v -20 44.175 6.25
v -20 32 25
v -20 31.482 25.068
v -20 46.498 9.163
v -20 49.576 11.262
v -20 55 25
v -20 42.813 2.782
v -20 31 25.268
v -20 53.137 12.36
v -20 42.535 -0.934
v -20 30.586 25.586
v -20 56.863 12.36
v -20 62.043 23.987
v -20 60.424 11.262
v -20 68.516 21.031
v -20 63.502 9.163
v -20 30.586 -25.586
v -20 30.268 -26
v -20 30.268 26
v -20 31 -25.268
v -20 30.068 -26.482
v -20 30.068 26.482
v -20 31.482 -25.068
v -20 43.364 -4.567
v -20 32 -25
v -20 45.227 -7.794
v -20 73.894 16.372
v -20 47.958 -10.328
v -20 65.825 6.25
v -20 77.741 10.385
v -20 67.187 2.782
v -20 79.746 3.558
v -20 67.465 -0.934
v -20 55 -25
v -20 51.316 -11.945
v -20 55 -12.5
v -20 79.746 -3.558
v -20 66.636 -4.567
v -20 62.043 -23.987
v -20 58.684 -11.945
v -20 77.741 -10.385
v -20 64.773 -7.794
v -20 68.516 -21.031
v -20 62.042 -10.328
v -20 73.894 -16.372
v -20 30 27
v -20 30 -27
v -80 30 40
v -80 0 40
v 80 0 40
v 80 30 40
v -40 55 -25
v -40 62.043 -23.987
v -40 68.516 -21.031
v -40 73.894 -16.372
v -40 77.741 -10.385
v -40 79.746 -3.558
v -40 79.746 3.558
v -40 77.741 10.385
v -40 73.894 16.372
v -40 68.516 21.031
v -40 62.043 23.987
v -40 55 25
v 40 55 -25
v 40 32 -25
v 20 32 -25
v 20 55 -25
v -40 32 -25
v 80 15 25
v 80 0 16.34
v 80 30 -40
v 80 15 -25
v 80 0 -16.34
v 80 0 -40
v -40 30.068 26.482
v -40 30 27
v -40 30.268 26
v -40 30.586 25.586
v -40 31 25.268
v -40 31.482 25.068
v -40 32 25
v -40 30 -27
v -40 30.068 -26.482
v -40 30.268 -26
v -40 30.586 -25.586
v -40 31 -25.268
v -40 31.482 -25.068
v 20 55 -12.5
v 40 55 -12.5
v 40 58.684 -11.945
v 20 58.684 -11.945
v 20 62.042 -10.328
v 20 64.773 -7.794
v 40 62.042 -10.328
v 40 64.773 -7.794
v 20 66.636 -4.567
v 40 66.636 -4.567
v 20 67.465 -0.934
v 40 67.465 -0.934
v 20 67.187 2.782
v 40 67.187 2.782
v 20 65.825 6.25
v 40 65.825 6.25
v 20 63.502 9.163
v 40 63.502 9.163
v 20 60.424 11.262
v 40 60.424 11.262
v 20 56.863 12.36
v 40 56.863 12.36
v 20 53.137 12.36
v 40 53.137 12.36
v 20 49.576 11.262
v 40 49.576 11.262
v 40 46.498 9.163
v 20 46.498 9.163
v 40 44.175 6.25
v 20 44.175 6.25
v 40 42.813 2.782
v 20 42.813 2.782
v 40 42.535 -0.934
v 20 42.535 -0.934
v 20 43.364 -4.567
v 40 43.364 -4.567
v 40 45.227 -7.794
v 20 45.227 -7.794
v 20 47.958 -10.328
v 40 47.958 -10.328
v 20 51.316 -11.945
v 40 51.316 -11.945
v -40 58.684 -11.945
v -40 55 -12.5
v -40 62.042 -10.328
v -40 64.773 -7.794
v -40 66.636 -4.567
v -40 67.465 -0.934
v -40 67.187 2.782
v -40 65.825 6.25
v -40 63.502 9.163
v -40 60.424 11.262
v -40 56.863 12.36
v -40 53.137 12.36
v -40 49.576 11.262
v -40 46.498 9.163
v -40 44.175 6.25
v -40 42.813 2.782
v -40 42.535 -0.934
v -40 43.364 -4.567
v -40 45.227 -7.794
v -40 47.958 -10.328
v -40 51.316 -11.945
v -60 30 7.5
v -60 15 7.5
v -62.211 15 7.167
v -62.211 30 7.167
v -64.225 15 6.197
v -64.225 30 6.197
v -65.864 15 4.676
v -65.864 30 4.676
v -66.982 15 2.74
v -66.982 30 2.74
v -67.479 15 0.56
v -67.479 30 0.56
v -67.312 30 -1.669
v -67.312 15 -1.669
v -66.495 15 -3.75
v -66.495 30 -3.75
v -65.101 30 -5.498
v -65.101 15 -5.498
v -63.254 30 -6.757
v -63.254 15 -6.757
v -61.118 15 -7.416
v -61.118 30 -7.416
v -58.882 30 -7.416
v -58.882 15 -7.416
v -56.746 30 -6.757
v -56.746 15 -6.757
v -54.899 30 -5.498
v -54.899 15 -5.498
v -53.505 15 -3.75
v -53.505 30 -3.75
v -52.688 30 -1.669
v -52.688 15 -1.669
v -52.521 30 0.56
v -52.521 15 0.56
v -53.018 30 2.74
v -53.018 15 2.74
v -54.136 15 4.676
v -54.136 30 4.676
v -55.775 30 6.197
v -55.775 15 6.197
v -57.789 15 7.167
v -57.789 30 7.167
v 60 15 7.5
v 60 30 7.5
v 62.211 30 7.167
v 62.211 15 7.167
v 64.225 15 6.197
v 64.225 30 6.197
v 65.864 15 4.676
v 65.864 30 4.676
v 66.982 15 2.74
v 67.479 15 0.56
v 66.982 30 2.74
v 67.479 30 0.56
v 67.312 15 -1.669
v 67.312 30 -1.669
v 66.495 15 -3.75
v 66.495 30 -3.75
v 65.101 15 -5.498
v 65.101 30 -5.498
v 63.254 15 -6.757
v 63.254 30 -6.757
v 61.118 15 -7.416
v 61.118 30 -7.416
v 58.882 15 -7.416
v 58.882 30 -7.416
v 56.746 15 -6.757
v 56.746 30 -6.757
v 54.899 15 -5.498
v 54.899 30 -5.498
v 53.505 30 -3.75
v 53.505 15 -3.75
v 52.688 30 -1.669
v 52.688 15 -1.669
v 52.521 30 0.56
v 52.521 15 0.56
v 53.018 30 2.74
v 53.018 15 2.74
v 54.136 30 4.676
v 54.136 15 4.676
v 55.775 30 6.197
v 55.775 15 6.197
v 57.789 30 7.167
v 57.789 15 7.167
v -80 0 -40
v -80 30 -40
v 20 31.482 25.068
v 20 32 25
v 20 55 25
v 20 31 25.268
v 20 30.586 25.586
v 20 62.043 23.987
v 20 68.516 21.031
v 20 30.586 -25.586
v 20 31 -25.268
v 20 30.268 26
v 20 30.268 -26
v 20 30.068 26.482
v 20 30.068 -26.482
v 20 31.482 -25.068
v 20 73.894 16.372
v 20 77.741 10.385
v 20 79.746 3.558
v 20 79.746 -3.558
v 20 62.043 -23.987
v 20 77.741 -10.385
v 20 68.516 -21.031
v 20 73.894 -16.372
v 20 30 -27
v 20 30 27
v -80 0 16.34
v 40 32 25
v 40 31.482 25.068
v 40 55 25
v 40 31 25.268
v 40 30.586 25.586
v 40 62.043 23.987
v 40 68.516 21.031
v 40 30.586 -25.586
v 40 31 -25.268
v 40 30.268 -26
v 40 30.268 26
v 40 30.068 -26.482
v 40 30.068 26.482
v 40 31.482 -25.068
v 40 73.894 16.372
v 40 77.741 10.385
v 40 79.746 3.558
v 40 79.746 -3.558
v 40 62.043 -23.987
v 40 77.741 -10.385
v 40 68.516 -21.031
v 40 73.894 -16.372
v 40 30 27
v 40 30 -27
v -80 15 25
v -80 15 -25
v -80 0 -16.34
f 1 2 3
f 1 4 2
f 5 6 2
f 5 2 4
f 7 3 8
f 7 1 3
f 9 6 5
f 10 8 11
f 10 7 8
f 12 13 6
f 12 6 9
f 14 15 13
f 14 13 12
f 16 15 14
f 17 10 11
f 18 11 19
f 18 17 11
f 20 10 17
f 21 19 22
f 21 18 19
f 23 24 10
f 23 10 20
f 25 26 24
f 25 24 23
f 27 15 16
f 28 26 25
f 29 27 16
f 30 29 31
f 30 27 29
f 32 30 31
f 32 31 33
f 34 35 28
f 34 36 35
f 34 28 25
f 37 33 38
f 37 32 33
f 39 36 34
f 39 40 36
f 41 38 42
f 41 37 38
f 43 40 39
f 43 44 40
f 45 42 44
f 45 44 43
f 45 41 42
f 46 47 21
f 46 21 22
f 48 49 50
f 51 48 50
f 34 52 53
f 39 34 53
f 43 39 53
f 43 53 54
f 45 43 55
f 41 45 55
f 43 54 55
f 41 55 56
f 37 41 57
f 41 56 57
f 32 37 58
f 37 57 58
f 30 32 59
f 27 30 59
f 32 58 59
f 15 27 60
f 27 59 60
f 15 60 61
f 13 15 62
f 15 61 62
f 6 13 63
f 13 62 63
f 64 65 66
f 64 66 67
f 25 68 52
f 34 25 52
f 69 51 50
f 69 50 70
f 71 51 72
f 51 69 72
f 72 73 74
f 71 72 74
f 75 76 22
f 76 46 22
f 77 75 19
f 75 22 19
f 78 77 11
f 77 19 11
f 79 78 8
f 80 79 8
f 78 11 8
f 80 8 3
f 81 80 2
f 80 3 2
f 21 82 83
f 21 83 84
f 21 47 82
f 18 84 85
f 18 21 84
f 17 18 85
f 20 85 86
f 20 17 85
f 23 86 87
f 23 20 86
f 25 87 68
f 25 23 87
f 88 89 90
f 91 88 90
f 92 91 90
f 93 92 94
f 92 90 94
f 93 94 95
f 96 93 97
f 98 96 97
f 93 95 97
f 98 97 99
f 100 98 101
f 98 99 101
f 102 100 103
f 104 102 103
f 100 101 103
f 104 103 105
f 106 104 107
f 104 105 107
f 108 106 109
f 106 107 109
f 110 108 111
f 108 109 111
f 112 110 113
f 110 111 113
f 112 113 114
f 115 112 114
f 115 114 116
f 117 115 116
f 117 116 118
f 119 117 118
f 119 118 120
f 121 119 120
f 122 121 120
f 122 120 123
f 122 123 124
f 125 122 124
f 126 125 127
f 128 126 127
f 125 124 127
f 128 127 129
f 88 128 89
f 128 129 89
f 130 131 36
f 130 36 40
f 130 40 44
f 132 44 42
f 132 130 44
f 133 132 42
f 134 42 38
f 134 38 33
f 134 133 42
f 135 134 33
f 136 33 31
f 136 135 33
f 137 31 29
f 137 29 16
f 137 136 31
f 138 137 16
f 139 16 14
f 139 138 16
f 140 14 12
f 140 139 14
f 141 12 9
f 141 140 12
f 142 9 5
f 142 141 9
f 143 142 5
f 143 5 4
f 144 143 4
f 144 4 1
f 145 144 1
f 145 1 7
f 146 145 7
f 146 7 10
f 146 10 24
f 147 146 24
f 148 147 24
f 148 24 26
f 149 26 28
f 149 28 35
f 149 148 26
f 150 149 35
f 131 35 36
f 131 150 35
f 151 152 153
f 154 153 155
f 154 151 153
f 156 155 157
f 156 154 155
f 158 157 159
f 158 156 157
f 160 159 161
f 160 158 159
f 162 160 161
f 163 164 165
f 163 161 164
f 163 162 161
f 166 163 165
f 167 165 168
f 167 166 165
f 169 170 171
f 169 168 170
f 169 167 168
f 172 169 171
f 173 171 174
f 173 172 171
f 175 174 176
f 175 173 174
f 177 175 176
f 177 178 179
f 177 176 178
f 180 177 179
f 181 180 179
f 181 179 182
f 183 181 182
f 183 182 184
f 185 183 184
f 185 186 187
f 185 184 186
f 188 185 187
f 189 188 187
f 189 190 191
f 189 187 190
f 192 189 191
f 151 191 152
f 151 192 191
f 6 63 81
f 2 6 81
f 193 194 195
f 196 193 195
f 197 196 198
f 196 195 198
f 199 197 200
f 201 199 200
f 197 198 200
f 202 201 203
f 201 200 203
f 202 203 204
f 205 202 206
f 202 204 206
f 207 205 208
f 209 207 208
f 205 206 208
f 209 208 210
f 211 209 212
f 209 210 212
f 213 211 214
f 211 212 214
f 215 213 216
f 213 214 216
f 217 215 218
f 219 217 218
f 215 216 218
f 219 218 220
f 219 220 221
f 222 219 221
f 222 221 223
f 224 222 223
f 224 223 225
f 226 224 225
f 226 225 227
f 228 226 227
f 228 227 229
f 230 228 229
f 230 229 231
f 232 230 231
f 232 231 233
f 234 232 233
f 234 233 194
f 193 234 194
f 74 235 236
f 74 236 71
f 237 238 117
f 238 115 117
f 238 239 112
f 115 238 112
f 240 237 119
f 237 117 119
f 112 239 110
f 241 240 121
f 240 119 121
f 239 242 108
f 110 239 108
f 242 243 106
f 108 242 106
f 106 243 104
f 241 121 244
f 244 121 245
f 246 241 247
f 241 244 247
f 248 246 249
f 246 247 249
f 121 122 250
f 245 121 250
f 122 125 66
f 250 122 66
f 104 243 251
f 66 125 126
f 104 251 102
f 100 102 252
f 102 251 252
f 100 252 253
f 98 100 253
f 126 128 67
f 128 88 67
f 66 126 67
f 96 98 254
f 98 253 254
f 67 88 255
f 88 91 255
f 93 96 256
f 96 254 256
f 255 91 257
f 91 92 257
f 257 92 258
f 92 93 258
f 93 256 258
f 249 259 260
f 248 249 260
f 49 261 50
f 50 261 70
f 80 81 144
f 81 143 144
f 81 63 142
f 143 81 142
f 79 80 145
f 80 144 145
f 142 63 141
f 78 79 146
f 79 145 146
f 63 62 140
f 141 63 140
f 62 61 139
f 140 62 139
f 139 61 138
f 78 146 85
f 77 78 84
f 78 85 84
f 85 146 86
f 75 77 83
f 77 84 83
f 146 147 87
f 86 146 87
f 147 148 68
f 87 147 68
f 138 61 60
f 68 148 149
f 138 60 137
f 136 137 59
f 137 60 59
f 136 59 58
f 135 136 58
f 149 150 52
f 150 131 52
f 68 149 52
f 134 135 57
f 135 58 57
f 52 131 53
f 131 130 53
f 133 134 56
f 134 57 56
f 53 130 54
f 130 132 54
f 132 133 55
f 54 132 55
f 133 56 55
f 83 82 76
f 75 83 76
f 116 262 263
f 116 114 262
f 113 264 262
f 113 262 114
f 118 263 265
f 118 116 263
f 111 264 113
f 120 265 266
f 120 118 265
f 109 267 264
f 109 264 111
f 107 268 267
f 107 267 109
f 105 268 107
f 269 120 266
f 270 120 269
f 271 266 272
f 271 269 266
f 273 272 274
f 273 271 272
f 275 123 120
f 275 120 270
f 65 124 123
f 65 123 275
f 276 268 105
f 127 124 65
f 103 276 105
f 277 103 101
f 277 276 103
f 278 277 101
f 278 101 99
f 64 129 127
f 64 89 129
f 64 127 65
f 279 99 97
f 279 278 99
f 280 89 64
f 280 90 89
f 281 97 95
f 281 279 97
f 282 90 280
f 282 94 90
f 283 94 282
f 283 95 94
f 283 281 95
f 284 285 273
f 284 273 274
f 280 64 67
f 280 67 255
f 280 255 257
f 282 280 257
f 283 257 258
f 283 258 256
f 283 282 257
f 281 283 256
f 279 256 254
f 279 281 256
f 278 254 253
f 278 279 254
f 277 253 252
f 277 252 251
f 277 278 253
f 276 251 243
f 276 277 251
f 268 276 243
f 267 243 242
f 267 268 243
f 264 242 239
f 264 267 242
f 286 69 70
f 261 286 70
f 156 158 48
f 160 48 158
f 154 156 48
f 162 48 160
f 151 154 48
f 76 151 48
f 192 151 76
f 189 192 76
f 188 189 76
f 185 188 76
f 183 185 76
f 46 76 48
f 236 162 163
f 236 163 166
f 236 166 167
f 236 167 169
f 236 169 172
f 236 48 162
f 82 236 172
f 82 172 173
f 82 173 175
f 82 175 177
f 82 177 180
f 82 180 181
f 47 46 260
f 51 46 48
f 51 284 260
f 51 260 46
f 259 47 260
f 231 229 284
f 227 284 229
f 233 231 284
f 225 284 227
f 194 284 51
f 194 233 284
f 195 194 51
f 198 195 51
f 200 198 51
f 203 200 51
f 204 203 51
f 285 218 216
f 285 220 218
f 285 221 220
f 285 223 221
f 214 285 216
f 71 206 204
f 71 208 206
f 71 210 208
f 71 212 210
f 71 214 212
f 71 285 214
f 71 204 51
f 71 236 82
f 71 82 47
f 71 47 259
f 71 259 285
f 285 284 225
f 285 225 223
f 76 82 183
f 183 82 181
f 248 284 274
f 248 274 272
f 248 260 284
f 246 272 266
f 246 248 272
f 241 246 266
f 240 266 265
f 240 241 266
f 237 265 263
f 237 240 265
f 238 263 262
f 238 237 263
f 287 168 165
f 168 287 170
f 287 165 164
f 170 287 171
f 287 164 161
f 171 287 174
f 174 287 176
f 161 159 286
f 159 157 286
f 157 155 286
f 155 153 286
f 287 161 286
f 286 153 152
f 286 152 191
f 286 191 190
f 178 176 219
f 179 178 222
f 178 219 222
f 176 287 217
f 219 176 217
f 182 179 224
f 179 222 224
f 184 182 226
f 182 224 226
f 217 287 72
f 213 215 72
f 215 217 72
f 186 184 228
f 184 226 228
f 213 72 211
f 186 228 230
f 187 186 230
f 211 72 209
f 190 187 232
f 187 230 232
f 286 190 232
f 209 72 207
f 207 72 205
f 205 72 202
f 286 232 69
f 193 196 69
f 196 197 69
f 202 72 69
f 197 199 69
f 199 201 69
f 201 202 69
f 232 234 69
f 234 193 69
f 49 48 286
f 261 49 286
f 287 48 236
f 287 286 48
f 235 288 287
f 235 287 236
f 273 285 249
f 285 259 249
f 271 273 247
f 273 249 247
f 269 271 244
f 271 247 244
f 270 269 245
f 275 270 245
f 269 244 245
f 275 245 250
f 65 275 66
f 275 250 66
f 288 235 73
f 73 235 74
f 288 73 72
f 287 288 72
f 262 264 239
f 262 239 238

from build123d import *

# Parameters (mm, degrees)
SKETCH2_W           = 160
SKETCH2_H           = 80
BOSS_EXTRUDE1_DEPTH = 30
CUT_EXTRUDE1_DEPTH  = 168.630546142
SKETCH4_R           = 7.5
CUT_EXTRUDE2_DEPTH  = 95.339811321
BOSS_EXTRUDE2_START = -40
SKETCH5_R           = 12.5
BOSS_EXTRUDE2_DEPTH = 20
FILLET1_R           = 2


with BuildPart() as part:
    # Sketch2 → Boss-Extrude1 (new body)
    with BuildSketch(Plane(origin=(0, 0, 0), x_dir=(1, 0, 0), z_dir=(0, 1, 0))):
        Rectangle(SKETCH2_W, SKETCH2_H)
    extrude(amount=BOSS_EXTRUDE1_DEPTH)

    # Sketch3 → Cut-Extrude1 (cut, through all)
    with BuildSketch(Plane(origin=(80, 0, 0), x_dir=(0, 0, -1), z_dir=(1, 0, 0))):
        Polygon((-25, 15), (-16.339745962, 0), (16.339745962, 0), (25, 15), align=None)
    extrude(amount=-CUT_EXTRUDE1_DEPTH, mode=Mode.SUBTRACT)

    # Sketch4 → Cut-Extrude2 (cut, through all)
    with BuildSketch(Plane(origin=(0, 30, 0), x_dir=(1, 0, 0), z_dir=(0, 1, 0))):
        with Locations(Location((60, 0, 0), (0, 0, 270))):
            Circle(SKETCH4_R)
    cut_extrude2 = extrude(amount=-CUT_EXTRUDE2_DEPTH, mode=Mode.SUBTRACT)

    # Sketch5 → Boss-Extrude2 (add)
    with BuildSketch(Plane(origin=(80, 0, 0), x_dir=(0, 0, -1), z_dir=(1, 0, 0)).offset(BOSS_EXTRUDE2_START)):
        with BuildLine():
            ThreePointArc((25, 55), (0, 80), (-25, 55))
            Line((-25, 55), (-25, 30))
            Line((-25, 30), (25, 30))
            Line((25, 30), (25, 55))
        make_face()
        with Locations((0, 55)):
            Circle(SKETCH5_R, mode=Mode.SUBTRACT)
    boss_extrude2 = extrude(amount=-BOSS_EXTRUDE2_DEPTH)

    # Mirror1: Cut-Extrude2, Boss-Extrude2 across plane
    add(cut_extrude2.mirror(Plane(origin=(0, 0, 0), x_dir=(0, 0, 1), z_dir=(1, 0, 0))), mode=Mode.SUBTRACT)
    add(boss_extrude2.mirror(Plane(origin=(0, 0, 0), x_dir=(0, 0, 1), z_dir=(1, 0, 0))))

    # Fillet1
    fillet1_edges = [part.edges().sort_by_distance(p)[0] for p in [
        (30, 30, -25),
        (30, 30, 25),
        (-30, 30, 25),
        (-30, 30, -25),
    ]]
    fillet(fillet1_edges, radius=FILLET1_R)


solid = part.part
